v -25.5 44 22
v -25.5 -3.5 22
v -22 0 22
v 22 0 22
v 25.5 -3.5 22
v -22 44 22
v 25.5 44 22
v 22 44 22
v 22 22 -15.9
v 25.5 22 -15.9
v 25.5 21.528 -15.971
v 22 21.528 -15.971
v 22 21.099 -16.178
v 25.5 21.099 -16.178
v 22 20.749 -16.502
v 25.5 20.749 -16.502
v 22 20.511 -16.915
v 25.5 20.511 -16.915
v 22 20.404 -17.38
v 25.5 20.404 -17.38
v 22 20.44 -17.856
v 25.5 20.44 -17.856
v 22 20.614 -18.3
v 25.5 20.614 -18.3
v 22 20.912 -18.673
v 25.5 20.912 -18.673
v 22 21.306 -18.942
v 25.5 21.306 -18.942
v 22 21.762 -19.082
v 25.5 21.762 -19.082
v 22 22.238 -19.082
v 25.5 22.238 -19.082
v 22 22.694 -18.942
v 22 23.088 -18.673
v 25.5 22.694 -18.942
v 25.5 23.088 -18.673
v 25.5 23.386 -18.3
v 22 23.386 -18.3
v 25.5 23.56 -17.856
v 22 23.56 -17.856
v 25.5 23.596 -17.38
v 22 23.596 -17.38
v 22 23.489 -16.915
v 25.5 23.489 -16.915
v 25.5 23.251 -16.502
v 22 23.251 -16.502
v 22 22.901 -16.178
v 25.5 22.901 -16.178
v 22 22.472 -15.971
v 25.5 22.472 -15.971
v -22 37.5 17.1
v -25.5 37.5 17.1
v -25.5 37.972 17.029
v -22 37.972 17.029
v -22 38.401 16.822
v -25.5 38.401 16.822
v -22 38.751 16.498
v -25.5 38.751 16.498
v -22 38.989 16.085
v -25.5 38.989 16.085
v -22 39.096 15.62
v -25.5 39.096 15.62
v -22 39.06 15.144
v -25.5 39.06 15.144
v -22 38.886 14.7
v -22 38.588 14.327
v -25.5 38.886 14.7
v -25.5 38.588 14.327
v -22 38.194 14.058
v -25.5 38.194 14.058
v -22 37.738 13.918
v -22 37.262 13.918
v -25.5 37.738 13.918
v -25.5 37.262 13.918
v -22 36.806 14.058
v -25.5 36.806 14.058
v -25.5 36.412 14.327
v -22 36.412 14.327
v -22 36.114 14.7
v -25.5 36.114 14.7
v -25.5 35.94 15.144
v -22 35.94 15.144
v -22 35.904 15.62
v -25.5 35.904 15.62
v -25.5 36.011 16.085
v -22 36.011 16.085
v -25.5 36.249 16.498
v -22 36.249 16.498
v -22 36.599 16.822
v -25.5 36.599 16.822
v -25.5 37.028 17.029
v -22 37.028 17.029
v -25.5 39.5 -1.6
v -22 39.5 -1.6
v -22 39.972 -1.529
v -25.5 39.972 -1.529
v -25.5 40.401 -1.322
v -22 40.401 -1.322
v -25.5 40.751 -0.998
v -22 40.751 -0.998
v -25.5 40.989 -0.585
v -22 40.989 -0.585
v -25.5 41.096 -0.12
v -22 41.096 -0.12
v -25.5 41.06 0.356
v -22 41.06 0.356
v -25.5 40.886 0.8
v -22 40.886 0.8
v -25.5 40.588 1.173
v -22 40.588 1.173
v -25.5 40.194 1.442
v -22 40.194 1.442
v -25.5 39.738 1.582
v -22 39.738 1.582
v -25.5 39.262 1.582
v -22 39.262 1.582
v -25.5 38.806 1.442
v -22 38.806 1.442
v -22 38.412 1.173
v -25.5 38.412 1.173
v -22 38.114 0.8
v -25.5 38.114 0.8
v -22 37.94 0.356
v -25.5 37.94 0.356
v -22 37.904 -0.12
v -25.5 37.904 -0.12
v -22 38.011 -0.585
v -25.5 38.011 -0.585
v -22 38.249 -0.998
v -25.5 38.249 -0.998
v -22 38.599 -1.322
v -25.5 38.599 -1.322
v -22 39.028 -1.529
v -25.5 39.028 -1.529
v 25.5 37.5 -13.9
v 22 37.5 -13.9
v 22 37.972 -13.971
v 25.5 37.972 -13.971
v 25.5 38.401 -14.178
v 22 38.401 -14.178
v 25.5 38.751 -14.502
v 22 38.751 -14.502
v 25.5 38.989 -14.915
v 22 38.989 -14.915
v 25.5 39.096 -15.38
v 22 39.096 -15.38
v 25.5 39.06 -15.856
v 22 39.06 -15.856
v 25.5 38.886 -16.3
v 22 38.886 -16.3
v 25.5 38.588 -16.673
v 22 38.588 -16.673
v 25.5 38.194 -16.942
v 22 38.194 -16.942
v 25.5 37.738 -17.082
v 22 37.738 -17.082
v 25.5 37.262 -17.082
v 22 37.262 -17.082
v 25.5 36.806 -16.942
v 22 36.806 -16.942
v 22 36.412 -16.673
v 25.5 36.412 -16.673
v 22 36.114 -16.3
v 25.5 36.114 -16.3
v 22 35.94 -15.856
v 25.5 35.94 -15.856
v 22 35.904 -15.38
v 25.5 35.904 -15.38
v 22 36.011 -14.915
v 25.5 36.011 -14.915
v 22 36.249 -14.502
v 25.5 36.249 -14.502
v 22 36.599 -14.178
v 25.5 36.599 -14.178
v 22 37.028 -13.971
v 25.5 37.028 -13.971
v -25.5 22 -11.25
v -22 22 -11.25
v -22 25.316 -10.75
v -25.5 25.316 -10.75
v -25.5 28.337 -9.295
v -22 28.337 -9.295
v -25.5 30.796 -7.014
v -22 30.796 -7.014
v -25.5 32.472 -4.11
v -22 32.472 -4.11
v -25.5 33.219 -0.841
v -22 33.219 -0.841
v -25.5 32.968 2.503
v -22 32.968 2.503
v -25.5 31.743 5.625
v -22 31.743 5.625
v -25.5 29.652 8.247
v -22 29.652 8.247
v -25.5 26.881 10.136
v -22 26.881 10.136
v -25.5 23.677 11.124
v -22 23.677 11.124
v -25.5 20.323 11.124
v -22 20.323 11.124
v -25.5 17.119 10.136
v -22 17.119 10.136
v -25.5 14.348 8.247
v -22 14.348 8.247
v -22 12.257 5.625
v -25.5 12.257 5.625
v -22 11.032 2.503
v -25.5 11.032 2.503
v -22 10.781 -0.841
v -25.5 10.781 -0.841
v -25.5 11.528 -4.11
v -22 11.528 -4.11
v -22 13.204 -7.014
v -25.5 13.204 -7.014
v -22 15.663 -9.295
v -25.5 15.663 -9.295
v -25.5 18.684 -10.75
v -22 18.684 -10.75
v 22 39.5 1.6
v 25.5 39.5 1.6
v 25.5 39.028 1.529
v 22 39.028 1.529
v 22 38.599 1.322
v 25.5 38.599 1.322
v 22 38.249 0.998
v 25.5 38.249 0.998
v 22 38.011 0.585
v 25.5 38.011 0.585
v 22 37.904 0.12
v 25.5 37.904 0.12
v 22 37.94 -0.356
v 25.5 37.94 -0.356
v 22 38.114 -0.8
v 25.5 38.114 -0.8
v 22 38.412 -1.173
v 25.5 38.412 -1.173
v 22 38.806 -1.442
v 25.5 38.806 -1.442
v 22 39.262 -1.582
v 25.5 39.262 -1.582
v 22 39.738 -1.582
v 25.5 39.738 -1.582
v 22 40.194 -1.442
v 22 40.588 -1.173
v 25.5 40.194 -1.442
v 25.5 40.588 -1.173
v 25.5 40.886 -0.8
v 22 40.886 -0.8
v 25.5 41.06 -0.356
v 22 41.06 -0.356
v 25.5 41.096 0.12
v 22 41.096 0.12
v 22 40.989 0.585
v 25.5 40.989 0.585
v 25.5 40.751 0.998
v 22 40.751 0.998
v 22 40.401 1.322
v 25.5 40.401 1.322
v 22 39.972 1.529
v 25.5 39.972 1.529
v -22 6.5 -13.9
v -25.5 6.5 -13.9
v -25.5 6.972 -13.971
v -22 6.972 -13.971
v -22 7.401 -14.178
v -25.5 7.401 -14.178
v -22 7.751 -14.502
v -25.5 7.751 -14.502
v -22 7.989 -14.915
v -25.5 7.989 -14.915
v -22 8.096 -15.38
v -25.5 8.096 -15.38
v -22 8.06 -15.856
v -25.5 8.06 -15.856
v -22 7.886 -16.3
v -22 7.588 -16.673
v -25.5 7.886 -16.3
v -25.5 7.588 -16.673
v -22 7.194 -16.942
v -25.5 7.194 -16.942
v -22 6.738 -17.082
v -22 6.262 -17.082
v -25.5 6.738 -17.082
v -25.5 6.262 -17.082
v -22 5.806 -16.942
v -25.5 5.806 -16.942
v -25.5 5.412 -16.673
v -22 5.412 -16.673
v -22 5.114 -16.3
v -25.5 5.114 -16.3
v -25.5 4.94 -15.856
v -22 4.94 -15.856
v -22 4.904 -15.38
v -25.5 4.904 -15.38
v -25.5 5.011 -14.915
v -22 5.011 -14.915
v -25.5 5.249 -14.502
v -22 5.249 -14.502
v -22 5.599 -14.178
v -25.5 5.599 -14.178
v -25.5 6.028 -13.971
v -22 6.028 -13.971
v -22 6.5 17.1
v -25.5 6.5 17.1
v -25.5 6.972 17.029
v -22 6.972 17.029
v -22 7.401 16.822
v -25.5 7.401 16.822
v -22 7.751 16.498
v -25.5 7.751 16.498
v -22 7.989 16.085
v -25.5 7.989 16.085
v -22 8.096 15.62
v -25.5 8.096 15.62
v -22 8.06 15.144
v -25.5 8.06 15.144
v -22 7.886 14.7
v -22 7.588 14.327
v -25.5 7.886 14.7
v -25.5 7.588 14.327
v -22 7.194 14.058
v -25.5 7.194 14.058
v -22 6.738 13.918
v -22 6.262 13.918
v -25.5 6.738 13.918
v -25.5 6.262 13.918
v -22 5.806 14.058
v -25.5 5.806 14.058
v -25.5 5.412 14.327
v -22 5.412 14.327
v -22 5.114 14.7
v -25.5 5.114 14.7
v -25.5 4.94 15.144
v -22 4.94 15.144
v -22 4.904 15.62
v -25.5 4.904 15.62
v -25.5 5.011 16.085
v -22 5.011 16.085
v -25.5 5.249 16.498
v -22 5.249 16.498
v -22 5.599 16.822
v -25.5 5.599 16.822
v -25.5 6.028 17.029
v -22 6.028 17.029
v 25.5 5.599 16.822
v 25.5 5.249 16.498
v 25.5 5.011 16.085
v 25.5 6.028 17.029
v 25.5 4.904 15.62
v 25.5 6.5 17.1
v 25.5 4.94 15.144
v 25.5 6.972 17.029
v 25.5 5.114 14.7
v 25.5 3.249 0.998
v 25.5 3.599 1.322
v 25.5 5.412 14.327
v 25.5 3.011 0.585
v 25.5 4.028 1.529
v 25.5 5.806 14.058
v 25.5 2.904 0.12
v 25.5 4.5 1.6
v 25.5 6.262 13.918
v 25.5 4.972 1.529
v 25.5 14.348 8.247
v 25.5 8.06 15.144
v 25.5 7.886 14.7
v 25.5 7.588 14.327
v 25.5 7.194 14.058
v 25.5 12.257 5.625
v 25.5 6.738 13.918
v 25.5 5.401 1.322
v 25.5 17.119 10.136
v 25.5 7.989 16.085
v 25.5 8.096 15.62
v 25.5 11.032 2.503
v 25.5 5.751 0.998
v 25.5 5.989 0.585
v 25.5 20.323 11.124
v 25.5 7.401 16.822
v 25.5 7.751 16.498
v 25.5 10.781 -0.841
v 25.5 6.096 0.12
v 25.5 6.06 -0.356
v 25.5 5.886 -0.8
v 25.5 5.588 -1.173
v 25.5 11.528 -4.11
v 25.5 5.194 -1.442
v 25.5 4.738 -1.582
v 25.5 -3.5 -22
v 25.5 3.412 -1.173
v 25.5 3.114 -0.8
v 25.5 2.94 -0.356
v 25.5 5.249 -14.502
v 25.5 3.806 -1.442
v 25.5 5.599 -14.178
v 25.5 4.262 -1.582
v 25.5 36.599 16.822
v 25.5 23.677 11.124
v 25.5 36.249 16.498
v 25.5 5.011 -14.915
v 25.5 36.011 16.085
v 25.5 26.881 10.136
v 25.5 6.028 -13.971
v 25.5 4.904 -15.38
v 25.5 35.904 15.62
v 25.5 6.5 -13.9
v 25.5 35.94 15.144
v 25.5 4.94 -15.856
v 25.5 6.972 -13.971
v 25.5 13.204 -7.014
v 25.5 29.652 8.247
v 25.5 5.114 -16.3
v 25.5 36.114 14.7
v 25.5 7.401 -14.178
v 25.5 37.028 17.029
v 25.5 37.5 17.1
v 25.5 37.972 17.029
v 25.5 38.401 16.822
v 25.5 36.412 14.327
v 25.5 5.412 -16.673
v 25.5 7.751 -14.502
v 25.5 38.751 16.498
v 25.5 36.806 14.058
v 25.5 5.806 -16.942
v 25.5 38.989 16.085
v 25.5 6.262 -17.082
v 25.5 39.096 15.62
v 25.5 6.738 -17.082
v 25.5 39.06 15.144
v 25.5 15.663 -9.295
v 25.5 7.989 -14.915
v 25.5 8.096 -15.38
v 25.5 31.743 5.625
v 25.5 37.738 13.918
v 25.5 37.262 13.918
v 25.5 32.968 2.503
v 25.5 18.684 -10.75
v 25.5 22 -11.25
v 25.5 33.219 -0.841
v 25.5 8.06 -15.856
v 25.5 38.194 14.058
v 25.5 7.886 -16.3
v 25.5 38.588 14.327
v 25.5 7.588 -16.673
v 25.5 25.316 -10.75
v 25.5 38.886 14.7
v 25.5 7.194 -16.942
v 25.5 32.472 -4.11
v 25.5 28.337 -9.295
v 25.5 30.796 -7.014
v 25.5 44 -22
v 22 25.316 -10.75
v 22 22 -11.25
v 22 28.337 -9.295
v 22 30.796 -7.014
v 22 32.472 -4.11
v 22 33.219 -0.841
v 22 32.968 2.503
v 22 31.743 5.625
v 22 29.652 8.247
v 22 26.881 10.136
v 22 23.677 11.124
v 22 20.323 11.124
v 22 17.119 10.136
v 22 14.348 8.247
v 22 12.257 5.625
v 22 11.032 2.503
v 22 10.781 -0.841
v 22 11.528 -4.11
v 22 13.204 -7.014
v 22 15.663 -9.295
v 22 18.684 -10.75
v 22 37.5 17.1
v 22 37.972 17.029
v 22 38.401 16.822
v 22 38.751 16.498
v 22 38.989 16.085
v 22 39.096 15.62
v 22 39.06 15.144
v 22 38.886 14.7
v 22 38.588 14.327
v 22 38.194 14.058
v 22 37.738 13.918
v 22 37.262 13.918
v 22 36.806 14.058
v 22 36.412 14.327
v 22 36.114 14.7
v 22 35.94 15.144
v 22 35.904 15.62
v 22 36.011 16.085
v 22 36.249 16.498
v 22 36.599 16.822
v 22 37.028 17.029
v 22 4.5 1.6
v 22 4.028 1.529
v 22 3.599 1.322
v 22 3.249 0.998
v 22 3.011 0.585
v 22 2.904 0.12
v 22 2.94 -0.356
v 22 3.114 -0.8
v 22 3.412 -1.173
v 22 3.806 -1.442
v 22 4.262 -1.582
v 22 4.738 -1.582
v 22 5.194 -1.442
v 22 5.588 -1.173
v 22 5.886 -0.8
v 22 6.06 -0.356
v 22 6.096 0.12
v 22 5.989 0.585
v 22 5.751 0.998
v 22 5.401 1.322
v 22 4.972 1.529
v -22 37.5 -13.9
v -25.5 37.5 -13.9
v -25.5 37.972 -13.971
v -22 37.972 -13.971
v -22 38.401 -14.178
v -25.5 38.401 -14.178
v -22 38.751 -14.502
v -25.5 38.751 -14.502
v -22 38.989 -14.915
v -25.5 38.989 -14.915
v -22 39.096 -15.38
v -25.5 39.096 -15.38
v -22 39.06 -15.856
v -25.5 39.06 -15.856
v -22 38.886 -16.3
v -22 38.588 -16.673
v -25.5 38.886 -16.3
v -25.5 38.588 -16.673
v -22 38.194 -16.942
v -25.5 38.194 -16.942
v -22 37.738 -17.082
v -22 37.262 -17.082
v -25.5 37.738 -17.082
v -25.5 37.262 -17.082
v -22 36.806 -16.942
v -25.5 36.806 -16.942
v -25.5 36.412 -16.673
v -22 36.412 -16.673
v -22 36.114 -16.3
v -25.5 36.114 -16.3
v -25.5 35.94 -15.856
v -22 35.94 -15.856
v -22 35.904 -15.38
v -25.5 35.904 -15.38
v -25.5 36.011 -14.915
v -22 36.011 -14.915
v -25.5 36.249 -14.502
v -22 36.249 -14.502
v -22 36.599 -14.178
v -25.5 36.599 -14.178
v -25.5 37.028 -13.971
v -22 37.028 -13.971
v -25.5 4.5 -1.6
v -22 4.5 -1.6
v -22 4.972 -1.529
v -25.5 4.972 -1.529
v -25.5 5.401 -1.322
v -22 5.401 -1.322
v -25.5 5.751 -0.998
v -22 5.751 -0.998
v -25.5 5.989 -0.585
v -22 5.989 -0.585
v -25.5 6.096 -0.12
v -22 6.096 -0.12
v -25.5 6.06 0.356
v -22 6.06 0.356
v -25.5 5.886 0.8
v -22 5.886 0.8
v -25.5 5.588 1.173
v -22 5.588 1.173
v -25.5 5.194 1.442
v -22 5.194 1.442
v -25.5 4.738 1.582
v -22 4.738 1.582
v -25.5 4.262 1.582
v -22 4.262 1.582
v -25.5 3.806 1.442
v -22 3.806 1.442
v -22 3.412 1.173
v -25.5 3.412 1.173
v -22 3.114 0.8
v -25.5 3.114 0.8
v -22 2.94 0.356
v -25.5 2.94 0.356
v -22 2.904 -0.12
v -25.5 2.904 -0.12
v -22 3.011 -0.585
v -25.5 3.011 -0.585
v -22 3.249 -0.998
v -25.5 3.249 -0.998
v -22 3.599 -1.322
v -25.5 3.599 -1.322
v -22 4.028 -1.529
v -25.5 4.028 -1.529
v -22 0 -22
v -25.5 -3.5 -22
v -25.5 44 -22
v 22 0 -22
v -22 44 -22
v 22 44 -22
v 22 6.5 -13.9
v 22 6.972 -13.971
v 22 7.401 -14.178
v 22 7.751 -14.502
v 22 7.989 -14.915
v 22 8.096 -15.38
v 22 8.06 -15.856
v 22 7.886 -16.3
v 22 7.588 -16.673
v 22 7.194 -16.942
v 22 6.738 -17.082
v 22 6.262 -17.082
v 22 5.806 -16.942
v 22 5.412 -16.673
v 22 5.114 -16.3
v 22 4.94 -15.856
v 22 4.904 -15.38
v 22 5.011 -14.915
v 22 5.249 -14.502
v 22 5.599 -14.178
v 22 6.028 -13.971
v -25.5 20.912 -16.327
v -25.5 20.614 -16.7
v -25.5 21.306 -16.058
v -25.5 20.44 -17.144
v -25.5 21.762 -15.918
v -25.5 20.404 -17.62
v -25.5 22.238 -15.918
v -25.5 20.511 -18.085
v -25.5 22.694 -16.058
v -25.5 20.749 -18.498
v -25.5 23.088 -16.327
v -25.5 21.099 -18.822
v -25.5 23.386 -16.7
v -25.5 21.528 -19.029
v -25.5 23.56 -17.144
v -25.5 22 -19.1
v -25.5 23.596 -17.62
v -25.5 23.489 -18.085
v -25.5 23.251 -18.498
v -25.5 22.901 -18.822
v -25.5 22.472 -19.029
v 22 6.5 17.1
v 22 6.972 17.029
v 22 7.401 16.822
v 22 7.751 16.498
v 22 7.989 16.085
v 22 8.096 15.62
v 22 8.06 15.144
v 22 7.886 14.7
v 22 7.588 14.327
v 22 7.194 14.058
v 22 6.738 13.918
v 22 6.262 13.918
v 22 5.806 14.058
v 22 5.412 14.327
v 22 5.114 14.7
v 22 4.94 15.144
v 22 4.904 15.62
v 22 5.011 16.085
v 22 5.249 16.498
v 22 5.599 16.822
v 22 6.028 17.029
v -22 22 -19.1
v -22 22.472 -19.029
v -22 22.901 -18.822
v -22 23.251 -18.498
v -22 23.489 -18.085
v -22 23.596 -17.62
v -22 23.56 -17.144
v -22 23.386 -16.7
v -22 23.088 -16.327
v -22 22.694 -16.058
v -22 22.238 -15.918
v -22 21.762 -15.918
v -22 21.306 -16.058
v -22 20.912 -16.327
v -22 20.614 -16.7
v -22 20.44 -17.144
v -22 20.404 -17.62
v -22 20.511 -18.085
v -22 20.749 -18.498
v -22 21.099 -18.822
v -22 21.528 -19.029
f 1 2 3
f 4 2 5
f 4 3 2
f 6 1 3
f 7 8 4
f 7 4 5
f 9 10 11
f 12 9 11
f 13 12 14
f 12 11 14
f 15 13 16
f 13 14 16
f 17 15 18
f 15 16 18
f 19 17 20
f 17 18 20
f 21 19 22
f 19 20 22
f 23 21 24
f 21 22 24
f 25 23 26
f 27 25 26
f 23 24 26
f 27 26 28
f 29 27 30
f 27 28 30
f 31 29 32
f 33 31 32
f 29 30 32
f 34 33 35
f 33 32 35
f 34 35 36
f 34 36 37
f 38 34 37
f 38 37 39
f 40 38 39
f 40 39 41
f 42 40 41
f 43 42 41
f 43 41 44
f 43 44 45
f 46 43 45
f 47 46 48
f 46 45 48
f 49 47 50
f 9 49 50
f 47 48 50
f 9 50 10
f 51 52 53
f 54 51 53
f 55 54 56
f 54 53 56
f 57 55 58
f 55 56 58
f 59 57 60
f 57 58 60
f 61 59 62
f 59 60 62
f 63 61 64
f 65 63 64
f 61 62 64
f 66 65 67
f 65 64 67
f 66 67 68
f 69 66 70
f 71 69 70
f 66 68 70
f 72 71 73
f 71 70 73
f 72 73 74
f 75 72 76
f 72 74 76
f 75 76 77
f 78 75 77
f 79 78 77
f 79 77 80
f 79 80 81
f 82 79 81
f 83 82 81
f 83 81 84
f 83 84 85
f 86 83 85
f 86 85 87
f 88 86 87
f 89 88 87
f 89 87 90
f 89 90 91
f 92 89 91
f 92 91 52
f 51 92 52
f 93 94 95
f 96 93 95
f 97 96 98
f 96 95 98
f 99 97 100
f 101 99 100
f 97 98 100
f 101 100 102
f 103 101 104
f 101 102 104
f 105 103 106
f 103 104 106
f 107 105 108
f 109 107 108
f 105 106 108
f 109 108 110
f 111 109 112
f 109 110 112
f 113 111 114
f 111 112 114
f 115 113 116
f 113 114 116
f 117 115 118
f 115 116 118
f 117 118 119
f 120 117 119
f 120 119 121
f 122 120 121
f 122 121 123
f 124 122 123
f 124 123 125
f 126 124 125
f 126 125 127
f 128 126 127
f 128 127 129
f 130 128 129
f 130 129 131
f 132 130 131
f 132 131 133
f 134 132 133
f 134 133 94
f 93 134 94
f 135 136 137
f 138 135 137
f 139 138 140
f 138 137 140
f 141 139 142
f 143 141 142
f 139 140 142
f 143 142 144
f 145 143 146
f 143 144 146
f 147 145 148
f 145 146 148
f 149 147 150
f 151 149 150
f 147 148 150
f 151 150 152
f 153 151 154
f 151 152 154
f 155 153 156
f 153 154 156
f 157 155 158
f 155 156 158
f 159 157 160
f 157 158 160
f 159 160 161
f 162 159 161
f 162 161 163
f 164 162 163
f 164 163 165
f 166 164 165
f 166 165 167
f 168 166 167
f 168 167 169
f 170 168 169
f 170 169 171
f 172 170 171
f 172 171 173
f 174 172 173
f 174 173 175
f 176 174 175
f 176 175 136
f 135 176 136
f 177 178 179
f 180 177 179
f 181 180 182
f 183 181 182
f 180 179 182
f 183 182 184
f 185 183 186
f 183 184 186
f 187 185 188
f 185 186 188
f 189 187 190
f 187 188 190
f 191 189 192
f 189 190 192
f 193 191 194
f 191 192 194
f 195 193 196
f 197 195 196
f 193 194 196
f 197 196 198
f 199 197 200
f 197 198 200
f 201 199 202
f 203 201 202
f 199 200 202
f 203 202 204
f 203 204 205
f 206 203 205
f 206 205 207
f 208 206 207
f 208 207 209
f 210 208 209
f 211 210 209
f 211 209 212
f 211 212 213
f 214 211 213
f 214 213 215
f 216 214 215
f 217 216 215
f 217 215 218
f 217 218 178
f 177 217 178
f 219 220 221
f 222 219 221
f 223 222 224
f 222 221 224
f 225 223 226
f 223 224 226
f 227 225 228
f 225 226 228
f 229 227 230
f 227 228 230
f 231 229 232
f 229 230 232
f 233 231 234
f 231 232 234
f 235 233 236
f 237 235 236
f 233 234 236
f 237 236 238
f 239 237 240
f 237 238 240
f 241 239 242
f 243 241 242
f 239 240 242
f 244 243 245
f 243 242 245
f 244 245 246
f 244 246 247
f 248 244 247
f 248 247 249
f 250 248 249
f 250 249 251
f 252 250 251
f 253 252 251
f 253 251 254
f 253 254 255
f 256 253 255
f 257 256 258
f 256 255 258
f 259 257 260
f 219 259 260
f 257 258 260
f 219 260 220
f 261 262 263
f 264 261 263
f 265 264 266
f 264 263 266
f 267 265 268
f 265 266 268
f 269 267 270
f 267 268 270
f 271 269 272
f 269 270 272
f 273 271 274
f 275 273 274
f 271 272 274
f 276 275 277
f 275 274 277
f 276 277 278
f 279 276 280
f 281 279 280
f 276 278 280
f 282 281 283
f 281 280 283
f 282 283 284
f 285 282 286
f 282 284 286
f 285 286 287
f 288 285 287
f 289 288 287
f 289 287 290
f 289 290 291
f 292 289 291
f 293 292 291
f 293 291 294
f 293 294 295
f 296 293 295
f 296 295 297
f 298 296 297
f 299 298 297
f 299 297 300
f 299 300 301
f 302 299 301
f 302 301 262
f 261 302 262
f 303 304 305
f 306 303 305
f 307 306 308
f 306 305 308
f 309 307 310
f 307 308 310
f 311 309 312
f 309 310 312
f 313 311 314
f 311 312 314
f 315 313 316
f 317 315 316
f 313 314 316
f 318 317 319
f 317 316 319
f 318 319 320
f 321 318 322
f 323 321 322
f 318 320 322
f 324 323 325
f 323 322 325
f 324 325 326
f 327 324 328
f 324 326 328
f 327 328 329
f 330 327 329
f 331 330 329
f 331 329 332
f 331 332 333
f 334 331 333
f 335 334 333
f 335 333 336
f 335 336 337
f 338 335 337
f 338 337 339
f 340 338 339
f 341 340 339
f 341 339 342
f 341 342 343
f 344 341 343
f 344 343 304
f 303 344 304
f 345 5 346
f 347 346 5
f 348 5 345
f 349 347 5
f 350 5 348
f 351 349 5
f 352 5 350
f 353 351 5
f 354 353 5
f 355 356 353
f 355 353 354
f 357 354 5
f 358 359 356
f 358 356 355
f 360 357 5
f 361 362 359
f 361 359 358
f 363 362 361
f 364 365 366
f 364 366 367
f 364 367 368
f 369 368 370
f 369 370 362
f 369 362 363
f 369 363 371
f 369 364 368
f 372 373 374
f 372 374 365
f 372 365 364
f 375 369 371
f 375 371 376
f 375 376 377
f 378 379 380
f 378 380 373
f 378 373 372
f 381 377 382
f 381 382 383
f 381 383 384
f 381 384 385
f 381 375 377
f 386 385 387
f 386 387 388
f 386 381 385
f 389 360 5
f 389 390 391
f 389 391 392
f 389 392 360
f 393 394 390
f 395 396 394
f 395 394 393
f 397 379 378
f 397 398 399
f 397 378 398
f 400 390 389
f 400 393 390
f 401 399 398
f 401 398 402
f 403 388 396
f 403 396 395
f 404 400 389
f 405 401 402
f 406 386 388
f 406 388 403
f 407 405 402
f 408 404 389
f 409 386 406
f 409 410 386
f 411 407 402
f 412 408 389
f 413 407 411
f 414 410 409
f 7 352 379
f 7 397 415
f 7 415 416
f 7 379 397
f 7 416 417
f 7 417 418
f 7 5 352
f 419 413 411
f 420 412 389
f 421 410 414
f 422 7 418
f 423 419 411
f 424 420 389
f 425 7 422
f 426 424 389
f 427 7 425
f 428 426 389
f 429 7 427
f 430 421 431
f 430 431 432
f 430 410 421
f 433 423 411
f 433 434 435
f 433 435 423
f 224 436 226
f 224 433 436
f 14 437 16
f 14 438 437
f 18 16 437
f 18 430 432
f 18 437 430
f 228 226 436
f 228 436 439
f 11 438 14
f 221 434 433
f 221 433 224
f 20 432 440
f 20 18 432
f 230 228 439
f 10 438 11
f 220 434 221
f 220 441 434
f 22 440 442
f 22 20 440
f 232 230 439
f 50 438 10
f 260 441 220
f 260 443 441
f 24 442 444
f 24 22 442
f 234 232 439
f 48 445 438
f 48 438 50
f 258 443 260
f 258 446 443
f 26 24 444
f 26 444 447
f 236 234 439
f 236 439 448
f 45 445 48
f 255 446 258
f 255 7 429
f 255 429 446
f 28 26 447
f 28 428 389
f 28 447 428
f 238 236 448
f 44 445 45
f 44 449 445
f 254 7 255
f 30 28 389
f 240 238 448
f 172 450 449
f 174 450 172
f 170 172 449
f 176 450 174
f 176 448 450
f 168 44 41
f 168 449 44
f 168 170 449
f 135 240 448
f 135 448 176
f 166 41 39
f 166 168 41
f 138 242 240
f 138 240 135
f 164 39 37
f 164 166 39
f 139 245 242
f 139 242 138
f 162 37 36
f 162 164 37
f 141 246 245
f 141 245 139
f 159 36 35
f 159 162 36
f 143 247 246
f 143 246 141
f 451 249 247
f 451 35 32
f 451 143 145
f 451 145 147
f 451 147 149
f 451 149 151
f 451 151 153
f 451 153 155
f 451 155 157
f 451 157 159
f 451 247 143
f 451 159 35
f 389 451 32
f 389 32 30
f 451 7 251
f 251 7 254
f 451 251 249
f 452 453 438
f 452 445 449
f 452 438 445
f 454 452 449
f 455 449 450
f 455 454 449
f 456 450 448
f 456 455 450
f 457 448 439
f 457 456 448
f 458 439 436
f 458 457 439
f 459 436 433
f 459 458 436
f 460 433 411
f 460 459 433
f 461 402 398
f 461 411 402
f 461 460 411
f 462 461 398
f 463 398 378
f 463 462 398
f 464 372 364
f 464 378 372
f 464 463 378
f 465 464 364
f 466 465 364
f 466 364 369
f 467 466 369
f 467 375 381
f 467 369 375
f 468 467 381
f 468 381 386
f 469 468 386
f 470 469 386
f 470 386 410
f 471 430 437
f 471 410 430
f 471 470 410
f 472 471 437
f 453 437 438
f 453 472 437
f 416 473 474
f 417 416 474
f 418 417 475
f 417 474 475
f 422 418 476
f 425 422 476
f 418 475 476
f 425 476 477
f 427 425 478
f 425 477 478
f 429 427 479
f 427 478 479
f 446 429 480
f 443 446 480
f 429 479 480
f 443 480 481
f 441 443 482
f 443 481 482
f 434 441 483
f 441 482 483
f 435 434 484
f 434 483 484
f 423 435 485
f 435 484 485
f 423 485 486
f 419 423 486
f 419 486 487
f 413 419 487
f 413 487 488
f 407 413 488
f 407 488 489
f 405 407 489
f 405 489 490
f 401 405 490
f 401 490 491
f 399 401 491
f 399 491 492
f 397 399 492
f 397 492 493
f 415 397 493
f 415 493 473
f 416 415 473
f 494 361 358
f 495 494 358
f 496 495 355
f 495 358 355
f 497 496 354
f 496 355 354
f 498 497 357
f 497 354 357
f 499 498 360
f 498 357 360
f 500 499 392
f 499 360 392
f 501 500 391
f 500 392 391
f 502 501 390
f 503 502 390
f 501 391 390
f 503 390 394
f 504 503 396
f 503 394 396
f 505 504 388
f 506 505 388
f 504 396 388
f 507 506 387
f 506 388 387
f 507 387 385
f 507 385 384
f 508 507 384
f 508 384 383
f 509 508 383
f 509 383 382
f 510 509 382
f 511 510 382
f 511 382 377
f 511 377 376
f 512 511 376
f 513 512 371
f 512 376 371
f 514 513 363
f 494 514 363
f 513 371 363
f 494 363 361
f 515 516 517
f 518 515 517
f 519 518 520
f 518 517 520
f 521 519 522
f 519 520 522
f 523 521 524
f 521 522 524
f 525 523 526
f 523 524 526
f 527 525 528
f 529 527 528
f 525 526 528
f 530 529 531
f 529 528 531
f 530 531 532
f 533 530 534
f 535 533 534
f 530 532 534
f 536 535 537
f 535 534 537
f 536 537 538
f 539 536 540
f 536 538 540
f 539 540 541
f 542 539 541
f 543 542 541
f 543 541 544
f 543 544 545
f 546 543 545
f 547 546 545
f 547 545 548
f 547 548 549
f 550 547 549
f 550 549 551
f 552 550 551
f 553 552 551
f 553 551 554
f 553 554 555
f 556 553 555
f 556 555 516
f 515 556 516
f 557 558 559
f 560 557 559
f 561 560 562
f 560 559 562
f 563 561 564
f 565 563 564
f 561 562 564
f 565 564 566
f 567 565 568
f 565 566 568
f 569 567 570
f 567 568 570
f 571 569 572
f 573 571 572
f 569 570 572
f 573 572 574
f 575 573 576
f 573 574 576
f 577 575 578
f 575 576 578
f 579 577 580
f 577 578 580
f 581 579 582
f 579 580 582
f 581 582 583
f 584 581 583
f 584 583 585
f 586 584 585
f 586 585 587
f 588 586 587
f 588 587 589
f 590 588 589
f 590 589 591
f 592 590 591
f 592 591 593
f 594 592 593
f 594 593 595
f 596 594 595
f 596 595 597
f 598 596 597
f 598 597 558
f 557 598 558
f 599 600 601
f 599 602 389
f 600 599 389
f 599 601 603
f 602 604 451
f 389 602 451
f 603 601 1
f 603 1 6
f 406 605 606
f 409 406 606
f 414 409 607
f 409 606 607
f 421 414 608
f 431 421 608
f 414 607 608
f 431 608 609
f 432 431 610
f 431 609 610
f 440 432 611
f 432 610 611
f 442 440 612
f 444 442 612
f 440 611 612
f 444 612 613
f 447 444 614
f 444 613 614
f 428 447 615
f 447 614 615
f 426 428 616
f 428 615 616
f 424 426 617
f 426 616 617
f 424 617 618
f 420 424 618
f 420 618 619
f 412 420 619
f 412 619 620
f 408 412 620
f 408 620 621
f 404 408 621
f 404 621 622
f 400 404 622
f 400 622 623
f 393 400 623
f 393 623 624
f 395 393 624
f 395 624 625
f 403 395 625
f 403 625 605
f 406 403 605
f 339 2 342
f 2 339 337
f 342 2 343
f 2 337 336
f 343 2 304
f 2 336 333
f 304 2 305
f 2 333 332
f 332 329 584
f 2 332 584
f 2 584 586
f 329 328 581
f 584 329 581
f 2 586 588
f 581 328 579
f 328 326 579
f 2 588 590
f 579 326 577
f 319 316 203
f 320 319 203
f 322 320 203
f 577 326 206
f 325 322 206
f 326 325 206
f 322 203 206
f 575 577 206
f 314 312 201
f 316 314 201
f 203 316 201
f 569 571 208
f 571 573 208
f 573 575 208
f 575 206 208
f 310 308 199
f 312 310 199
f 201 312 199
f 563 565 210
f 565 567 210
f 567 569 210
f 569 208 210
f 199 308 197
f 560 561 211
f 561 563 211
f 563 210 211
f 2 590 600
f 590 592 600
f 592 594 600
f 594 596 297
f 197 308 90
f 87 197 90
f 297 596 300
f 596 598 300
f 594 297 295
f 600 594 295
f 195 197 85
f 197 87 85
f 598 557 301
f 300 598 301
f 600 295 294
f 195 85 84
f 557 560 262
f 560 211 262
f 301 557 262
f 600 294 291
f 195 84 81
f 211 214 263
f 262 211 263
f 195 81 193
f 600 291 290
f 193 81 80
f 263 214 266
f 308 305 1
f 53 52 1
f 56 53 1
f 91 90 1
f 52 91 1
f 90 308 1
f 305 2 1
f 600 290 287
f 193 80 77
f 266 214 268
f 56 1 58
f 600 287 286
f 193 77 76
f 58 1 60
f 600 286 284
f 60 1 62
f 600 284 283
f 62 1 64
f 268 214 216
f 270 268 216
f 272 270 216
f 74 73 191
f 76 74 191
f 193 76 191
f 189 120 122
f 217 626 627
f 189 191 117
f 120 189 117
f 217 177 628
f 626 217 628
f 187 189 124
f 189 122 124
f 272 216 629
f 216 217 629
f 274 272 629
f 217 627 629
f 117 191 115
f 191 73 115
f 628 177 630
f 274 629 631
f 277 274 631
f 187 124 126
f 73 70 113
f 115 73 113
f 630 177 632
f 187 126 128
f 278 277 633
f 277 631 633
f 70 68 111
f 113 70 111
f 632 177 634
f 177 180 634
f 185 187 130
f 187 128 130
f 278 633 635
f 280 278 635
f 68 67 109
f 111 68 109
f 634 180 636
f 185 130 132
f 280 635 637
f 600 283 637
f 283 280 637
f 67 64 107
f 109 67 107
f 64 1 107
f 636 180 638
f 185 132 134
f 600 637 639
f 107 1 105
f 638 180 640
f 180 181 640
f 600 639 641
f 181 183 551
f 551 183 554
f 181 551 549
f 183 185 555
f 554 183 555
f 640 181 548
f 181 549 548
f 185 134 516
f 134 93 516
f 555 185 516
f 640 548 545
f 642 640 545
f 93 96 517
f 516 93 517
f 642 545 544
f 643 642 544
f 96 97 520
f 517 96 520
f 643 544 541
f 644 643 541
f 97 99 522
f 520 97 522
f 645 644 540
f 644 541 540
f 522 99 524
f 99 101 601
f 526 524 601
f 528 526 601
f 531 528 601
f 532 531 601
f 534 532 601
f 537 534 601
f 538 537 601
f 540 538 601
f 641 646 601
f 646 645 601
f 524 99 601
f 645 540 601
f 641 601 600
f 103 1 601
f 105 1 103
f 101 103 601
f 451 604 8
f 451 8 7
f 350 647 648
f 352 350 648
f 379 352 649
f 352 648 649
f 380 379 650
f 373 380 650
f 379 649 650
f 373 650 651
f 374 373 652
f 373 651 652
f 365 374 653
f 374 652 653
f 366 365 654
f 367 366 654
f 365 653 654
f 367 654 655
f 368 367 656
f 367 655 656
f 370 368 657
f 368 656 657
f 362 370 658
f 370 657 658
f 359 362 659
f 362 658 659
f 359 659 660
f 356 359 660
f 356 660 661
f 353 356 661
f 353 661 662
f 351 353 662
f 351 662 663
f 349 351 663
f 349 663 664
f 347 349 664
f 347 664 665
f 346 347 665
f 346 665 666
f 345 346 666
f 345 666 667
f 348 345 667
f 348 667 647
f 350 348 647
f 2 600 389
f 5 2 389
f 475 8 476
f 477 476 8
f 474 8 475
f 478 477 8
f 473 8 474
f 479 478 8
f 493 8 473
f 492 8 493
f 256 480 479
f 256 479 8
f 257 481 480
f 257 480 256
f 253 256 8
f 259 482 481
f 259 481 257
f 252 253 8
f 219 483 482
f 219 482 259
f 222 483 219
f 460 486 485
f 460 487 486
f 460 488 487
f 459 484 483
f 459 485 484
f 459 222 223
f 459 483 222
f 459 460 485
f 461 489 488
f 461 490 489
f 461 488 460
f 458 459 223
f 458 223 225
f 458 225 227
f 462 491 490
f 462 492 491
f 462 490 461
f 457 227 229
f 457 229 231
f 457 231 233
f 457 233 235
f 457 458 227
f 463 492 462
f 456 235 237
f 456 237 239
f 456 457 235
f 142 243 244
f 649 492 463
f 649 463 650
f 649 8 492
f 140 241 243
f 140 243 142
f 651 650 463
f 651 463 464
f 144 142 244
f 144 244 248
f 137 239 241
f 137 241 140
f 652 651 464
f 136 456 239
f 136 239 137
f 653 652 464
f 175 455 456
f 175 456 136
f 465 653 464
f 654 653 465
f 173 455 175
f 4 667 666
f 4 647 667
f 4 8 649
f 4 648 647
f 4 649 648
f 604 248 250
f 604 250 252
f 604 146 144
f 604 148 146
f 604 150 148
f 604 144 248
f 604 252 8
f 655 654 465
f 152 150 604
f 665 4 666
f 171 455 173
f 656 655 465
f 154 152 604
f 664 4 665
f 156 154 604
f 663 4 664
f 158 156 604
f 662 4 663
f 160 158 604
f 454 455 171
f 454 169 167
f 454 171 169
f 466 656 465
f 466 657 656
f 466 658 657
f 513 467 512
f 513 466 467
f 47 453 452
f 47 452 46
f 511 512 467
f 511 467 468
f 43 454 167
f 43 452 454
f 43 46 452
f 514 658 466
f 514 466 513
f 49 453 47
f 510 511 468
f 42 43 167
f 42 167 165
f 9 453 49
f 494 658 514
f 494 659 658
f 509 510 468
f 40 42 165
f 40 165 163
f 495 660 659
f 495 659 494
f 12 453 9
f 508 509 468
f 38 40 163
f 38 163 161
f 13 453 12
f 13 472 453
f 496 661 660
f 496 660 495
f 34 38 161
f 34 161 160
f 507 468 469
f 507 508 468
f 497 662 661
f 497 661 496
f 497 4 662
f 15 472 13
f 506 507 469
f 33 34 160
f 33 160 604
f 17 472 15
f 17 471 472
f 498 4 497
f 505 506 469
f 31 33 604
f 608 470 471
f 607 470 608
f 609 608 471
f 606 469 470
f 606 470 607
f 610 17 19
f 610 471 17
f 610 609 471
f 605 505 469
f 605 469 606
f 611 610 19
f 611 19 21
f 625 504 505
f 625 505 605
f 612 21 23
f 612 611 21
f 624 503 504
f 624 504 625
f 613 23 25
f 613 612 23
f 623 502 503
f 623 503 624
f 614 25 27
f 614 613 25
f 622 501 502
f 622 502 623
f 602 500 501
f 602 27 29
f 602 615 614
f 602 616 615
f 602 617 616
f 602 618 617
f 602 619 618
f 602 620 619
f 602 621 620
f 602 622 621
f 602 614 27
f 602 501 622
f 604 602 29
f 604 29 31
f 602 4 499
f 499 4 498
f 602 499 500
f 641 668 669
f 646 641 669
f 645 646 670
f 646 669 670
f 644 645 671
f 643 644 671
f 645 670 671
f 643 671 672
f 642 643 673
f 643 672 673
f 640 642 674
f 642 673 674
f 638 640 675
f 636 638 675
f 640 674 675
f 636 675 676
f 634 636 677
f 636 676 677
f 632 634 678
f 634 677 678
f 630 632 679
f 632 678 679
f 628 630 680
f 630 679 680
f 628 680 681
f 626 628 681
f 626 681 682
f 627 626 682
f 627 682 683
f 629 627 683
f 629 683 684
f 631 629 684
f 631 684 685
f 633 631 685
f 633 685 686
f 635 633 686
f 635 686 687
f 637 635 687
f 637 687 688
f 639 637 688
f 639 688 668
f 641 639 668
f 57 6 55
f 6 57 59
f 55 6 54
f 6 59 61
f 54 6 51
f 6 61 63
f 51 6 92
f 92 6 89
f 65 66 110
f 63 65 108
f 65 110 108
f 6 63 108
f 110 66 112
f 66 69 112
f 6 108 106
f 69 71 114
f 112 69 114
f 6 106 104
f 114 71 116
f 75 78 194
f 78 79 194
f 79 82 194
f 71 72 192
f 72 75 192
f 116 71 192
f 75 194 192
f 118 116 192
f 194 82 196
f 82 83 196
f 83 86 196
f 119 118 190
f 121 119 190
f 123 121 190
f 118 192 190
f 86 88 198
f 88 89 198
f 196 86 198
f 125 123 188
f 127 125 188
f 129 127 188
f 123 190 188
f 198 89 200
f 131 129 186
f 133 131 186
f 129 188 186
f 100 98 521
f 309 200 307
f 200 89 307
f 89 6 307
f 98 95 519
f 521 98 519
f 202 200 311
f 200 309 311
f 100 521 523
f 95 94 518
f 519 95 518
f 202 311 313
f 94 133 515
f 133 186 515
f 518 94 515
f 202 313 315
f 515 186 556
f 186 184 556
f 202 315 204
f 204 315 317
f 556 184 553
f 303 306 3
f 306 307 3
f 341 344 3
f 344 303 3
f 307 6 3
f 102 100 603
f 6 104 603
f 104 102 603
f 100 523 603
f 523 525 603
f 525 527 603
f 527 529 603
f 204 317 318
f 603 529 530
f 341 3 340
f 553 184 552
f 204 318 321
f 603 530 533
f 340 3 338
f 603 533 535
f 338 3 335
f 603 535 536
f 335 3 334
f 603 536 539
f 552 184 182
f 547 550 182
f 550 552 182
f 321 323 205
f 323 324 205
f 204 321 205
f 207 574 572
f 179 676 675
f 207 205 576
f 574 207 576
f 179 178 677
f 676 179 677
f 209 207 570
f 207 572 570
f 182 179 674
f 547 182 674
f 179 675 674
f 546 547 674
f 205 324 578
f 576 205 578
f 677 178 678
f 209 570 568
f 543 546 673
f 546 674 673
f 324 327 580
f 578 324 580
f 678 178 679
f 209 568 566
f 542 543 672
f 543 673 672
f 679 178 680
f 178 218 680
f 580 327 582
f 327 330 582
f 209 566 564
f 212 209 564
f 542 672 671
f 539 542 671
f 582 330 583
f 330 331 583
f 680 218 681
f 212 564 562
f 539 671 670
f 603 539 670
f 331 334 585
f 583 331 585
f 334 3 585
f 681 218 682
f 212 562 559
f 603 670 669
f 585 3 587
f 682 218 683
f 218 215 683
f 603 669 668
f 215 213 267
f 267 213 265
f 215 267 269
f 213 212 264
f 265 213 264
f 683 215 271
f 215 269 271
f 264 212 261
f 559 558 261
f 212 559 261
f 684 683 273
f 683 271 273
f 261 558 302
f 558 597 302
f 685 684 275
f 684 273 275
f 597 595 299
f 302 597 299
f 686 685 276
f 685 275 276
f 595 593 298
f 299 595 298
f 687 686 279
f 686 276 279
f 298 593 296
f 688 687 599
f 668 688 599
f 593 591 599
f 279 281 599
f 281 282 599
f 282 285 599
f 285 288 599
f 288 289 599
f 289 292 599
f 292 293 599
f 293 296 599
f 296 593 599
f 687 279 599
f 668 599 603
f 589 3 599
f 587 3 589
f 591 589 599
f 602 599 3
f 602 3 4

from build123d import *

# Parameters (mm, degrees)
SKETCH1_W                     = 44
SKETCH1_H                     = 44
BOSS_EXTRUDE1_DEPTH           = 3.5
SKETCH3_W                     = 3.5
SKETCH3_H                     = 44
BOSS_EXTRUDE2_DEPTH           = 44
BOSS_EXTRUDE2_DEPTH_BACK      = 3.5
SKETCH4_W                     = 3.5
SKETCH4_H                     = 44
BOSS_EXTRUDE3_DEPTH           = 44
BOSS_EXTRUDE3_DEPTH_BACK      = 3.5
SKETCH5_R                     = 11.25
CUT_EXTRUDE1_DEPTH            = 26.5
CUT_EXTRUDE1_DEPTH_BACK       = 26.5
M3_CLEARANCE_HOLE1_D          = 3.2
SKETCH16_W                    = 1.6
SKETCH16_H                    = 25.5
M3_CLEARANCE_HOLE2_AT_2_COUNT = 2
M3_CLEARANCE_HOLE2_AT_2_PITCH = 24.748737342
M3_CLEARANCE_HOLE2_AT_3_COUNT = 2
M3_CLEARANCE_HOLE2_AT_3_PITCH = 24.748737342
M3_CLEARANCE_HOLE3_D          = 3.2


with BuildPart() as part:
    # Sketch1 → Boss-Extrude1 (new body)
    with BuildSketch(Plane(origin=(0, 0, 0), x_dir=(1, 0, 0), z_dir=(0, 1, 0))):
        Rectangle(SKETCH1_W, SKETCH1_H)
    extrude(amount=-BOSS_EXTRUDE1_DEPTH)

    # Sketch3 → Boss-Extrude2 (add, two sides)
    with BuildSketch(Plane(origin=(0, 0, 0), x_dir=(1, 0, 0), z_dir=(0, 1, 0))) as boss_extrude2_sk:
        with Locations((23.75, 0)):
            Rectangle(SKETCH3_W, SKETCH3_H)
    extrude(amount=BOSS_EXTRUDE2_DEPTH)
    extrude(boss_extrude2_sk.sketch, amount=-BOSS_EXTRUDE2_DEPTH_BACK)

    # Sketch4 → Boss-Extrude3 (add, two sides)
    with BuildSketch(Plane(origin=(0, 0, 0), x_dir=(1, 0, 0), z_dir=(0, 1, 0))) as boss_extrude3_sk:
        with Locations((-23.75, 0)):
            Rectangle(SKETCH4_W, SKETCH4_H)
    extrude(amount=BOSS_EXTRUDE3_DEPTH)
    extrude(boss_extrude3_sk.sketch, amount=-BOSS_EXTRUDE3_DEPTH_BACK)

    # Sketch5 → Cut-Extrude1 (cut, two sides)
    with BuildSketch(Plane(origin=(0, 0, 0), x_dir=(0, 0, -1), z_dir=(1, 0, 0))) as cut_extrude1_sk:
        with Locations((0, 22)):
            Circle(SKETCH5_R)
    extrude(amount=CUT_EXTRUDE1_DEPTH, mode=Mode.SUBTRACT)
    extrude(cut_extrude1_sk.sketch, amount=-CUT_EXTRUDE1_DEPTH_BACK, mode=Mode.SUBTRACT)

    # M3 Clearance Hole1 (through all)
    with Locations(Plane(origin=(25.5, 0, 0), x_dir=(0, 0, -1), z_dir=(1, 0, 0))):
        with Locations((-15.5, 6.5), (-15.5, 37.5), (15.5, 37.5), (15.5, 6.5)):
            Hole(M3_CLEARANCE_HOLE1_D / 2)

    # Sketch16 → M3 Clearance Hole2 (revolve, cut)
    with BuildSketch(Plane(origin=(0, 22, -17.5), x_dir=(0, 0, 1), z_dir=(0, 1, 0))):
        with Locations((0.8, 12.75)):
            Rectangle(SKETCH16_W, SKETCH16_H)
    m3_clearance_hole2 = revolve(axis=Axis((-6.35, 22, -17.5), (1, 0, 0)), mode=Mode.SUBTRACT)

    # M3 Clearance Hole2 at 2: M3 Clearance Hole2 ×2
    with Locations(*[Vector(0, 0.707106781, 0.707106781) * (i * M3_CLEARANCE_HOLE2_AT_2_PITCH) for i in range(1, M3_CLEARANCE_HOLE2_AT_2_COUNT)]):
        add(m3_clearance_hole2, mode=Mode.SUBTRACT)

    # M3 Clearance Hole2 at 3: M3 Clearance Hole2 ×2
    with Locations(*[Vector(0, -0.707106781, 0.707106781) * (i * M3_CLEARANCE_HOLE2_AT_3_PITCH) for i in range(1, M3_CLEARANCE_HOLE2_AT_3_COUNT)]):
        add(m3_clearance_hole2, mode=Mode.SUBTRACT)

    # M3 Clearance Hole3 (through all)
    with Locations(Plane.ZY.offset(25.5)):
        with Locations((0, 4.5), (0, 39.5), (-17.5, 22)):
            Hole(M3_CLEARANCE_HOLE3_D / 2)


solid = part.part
